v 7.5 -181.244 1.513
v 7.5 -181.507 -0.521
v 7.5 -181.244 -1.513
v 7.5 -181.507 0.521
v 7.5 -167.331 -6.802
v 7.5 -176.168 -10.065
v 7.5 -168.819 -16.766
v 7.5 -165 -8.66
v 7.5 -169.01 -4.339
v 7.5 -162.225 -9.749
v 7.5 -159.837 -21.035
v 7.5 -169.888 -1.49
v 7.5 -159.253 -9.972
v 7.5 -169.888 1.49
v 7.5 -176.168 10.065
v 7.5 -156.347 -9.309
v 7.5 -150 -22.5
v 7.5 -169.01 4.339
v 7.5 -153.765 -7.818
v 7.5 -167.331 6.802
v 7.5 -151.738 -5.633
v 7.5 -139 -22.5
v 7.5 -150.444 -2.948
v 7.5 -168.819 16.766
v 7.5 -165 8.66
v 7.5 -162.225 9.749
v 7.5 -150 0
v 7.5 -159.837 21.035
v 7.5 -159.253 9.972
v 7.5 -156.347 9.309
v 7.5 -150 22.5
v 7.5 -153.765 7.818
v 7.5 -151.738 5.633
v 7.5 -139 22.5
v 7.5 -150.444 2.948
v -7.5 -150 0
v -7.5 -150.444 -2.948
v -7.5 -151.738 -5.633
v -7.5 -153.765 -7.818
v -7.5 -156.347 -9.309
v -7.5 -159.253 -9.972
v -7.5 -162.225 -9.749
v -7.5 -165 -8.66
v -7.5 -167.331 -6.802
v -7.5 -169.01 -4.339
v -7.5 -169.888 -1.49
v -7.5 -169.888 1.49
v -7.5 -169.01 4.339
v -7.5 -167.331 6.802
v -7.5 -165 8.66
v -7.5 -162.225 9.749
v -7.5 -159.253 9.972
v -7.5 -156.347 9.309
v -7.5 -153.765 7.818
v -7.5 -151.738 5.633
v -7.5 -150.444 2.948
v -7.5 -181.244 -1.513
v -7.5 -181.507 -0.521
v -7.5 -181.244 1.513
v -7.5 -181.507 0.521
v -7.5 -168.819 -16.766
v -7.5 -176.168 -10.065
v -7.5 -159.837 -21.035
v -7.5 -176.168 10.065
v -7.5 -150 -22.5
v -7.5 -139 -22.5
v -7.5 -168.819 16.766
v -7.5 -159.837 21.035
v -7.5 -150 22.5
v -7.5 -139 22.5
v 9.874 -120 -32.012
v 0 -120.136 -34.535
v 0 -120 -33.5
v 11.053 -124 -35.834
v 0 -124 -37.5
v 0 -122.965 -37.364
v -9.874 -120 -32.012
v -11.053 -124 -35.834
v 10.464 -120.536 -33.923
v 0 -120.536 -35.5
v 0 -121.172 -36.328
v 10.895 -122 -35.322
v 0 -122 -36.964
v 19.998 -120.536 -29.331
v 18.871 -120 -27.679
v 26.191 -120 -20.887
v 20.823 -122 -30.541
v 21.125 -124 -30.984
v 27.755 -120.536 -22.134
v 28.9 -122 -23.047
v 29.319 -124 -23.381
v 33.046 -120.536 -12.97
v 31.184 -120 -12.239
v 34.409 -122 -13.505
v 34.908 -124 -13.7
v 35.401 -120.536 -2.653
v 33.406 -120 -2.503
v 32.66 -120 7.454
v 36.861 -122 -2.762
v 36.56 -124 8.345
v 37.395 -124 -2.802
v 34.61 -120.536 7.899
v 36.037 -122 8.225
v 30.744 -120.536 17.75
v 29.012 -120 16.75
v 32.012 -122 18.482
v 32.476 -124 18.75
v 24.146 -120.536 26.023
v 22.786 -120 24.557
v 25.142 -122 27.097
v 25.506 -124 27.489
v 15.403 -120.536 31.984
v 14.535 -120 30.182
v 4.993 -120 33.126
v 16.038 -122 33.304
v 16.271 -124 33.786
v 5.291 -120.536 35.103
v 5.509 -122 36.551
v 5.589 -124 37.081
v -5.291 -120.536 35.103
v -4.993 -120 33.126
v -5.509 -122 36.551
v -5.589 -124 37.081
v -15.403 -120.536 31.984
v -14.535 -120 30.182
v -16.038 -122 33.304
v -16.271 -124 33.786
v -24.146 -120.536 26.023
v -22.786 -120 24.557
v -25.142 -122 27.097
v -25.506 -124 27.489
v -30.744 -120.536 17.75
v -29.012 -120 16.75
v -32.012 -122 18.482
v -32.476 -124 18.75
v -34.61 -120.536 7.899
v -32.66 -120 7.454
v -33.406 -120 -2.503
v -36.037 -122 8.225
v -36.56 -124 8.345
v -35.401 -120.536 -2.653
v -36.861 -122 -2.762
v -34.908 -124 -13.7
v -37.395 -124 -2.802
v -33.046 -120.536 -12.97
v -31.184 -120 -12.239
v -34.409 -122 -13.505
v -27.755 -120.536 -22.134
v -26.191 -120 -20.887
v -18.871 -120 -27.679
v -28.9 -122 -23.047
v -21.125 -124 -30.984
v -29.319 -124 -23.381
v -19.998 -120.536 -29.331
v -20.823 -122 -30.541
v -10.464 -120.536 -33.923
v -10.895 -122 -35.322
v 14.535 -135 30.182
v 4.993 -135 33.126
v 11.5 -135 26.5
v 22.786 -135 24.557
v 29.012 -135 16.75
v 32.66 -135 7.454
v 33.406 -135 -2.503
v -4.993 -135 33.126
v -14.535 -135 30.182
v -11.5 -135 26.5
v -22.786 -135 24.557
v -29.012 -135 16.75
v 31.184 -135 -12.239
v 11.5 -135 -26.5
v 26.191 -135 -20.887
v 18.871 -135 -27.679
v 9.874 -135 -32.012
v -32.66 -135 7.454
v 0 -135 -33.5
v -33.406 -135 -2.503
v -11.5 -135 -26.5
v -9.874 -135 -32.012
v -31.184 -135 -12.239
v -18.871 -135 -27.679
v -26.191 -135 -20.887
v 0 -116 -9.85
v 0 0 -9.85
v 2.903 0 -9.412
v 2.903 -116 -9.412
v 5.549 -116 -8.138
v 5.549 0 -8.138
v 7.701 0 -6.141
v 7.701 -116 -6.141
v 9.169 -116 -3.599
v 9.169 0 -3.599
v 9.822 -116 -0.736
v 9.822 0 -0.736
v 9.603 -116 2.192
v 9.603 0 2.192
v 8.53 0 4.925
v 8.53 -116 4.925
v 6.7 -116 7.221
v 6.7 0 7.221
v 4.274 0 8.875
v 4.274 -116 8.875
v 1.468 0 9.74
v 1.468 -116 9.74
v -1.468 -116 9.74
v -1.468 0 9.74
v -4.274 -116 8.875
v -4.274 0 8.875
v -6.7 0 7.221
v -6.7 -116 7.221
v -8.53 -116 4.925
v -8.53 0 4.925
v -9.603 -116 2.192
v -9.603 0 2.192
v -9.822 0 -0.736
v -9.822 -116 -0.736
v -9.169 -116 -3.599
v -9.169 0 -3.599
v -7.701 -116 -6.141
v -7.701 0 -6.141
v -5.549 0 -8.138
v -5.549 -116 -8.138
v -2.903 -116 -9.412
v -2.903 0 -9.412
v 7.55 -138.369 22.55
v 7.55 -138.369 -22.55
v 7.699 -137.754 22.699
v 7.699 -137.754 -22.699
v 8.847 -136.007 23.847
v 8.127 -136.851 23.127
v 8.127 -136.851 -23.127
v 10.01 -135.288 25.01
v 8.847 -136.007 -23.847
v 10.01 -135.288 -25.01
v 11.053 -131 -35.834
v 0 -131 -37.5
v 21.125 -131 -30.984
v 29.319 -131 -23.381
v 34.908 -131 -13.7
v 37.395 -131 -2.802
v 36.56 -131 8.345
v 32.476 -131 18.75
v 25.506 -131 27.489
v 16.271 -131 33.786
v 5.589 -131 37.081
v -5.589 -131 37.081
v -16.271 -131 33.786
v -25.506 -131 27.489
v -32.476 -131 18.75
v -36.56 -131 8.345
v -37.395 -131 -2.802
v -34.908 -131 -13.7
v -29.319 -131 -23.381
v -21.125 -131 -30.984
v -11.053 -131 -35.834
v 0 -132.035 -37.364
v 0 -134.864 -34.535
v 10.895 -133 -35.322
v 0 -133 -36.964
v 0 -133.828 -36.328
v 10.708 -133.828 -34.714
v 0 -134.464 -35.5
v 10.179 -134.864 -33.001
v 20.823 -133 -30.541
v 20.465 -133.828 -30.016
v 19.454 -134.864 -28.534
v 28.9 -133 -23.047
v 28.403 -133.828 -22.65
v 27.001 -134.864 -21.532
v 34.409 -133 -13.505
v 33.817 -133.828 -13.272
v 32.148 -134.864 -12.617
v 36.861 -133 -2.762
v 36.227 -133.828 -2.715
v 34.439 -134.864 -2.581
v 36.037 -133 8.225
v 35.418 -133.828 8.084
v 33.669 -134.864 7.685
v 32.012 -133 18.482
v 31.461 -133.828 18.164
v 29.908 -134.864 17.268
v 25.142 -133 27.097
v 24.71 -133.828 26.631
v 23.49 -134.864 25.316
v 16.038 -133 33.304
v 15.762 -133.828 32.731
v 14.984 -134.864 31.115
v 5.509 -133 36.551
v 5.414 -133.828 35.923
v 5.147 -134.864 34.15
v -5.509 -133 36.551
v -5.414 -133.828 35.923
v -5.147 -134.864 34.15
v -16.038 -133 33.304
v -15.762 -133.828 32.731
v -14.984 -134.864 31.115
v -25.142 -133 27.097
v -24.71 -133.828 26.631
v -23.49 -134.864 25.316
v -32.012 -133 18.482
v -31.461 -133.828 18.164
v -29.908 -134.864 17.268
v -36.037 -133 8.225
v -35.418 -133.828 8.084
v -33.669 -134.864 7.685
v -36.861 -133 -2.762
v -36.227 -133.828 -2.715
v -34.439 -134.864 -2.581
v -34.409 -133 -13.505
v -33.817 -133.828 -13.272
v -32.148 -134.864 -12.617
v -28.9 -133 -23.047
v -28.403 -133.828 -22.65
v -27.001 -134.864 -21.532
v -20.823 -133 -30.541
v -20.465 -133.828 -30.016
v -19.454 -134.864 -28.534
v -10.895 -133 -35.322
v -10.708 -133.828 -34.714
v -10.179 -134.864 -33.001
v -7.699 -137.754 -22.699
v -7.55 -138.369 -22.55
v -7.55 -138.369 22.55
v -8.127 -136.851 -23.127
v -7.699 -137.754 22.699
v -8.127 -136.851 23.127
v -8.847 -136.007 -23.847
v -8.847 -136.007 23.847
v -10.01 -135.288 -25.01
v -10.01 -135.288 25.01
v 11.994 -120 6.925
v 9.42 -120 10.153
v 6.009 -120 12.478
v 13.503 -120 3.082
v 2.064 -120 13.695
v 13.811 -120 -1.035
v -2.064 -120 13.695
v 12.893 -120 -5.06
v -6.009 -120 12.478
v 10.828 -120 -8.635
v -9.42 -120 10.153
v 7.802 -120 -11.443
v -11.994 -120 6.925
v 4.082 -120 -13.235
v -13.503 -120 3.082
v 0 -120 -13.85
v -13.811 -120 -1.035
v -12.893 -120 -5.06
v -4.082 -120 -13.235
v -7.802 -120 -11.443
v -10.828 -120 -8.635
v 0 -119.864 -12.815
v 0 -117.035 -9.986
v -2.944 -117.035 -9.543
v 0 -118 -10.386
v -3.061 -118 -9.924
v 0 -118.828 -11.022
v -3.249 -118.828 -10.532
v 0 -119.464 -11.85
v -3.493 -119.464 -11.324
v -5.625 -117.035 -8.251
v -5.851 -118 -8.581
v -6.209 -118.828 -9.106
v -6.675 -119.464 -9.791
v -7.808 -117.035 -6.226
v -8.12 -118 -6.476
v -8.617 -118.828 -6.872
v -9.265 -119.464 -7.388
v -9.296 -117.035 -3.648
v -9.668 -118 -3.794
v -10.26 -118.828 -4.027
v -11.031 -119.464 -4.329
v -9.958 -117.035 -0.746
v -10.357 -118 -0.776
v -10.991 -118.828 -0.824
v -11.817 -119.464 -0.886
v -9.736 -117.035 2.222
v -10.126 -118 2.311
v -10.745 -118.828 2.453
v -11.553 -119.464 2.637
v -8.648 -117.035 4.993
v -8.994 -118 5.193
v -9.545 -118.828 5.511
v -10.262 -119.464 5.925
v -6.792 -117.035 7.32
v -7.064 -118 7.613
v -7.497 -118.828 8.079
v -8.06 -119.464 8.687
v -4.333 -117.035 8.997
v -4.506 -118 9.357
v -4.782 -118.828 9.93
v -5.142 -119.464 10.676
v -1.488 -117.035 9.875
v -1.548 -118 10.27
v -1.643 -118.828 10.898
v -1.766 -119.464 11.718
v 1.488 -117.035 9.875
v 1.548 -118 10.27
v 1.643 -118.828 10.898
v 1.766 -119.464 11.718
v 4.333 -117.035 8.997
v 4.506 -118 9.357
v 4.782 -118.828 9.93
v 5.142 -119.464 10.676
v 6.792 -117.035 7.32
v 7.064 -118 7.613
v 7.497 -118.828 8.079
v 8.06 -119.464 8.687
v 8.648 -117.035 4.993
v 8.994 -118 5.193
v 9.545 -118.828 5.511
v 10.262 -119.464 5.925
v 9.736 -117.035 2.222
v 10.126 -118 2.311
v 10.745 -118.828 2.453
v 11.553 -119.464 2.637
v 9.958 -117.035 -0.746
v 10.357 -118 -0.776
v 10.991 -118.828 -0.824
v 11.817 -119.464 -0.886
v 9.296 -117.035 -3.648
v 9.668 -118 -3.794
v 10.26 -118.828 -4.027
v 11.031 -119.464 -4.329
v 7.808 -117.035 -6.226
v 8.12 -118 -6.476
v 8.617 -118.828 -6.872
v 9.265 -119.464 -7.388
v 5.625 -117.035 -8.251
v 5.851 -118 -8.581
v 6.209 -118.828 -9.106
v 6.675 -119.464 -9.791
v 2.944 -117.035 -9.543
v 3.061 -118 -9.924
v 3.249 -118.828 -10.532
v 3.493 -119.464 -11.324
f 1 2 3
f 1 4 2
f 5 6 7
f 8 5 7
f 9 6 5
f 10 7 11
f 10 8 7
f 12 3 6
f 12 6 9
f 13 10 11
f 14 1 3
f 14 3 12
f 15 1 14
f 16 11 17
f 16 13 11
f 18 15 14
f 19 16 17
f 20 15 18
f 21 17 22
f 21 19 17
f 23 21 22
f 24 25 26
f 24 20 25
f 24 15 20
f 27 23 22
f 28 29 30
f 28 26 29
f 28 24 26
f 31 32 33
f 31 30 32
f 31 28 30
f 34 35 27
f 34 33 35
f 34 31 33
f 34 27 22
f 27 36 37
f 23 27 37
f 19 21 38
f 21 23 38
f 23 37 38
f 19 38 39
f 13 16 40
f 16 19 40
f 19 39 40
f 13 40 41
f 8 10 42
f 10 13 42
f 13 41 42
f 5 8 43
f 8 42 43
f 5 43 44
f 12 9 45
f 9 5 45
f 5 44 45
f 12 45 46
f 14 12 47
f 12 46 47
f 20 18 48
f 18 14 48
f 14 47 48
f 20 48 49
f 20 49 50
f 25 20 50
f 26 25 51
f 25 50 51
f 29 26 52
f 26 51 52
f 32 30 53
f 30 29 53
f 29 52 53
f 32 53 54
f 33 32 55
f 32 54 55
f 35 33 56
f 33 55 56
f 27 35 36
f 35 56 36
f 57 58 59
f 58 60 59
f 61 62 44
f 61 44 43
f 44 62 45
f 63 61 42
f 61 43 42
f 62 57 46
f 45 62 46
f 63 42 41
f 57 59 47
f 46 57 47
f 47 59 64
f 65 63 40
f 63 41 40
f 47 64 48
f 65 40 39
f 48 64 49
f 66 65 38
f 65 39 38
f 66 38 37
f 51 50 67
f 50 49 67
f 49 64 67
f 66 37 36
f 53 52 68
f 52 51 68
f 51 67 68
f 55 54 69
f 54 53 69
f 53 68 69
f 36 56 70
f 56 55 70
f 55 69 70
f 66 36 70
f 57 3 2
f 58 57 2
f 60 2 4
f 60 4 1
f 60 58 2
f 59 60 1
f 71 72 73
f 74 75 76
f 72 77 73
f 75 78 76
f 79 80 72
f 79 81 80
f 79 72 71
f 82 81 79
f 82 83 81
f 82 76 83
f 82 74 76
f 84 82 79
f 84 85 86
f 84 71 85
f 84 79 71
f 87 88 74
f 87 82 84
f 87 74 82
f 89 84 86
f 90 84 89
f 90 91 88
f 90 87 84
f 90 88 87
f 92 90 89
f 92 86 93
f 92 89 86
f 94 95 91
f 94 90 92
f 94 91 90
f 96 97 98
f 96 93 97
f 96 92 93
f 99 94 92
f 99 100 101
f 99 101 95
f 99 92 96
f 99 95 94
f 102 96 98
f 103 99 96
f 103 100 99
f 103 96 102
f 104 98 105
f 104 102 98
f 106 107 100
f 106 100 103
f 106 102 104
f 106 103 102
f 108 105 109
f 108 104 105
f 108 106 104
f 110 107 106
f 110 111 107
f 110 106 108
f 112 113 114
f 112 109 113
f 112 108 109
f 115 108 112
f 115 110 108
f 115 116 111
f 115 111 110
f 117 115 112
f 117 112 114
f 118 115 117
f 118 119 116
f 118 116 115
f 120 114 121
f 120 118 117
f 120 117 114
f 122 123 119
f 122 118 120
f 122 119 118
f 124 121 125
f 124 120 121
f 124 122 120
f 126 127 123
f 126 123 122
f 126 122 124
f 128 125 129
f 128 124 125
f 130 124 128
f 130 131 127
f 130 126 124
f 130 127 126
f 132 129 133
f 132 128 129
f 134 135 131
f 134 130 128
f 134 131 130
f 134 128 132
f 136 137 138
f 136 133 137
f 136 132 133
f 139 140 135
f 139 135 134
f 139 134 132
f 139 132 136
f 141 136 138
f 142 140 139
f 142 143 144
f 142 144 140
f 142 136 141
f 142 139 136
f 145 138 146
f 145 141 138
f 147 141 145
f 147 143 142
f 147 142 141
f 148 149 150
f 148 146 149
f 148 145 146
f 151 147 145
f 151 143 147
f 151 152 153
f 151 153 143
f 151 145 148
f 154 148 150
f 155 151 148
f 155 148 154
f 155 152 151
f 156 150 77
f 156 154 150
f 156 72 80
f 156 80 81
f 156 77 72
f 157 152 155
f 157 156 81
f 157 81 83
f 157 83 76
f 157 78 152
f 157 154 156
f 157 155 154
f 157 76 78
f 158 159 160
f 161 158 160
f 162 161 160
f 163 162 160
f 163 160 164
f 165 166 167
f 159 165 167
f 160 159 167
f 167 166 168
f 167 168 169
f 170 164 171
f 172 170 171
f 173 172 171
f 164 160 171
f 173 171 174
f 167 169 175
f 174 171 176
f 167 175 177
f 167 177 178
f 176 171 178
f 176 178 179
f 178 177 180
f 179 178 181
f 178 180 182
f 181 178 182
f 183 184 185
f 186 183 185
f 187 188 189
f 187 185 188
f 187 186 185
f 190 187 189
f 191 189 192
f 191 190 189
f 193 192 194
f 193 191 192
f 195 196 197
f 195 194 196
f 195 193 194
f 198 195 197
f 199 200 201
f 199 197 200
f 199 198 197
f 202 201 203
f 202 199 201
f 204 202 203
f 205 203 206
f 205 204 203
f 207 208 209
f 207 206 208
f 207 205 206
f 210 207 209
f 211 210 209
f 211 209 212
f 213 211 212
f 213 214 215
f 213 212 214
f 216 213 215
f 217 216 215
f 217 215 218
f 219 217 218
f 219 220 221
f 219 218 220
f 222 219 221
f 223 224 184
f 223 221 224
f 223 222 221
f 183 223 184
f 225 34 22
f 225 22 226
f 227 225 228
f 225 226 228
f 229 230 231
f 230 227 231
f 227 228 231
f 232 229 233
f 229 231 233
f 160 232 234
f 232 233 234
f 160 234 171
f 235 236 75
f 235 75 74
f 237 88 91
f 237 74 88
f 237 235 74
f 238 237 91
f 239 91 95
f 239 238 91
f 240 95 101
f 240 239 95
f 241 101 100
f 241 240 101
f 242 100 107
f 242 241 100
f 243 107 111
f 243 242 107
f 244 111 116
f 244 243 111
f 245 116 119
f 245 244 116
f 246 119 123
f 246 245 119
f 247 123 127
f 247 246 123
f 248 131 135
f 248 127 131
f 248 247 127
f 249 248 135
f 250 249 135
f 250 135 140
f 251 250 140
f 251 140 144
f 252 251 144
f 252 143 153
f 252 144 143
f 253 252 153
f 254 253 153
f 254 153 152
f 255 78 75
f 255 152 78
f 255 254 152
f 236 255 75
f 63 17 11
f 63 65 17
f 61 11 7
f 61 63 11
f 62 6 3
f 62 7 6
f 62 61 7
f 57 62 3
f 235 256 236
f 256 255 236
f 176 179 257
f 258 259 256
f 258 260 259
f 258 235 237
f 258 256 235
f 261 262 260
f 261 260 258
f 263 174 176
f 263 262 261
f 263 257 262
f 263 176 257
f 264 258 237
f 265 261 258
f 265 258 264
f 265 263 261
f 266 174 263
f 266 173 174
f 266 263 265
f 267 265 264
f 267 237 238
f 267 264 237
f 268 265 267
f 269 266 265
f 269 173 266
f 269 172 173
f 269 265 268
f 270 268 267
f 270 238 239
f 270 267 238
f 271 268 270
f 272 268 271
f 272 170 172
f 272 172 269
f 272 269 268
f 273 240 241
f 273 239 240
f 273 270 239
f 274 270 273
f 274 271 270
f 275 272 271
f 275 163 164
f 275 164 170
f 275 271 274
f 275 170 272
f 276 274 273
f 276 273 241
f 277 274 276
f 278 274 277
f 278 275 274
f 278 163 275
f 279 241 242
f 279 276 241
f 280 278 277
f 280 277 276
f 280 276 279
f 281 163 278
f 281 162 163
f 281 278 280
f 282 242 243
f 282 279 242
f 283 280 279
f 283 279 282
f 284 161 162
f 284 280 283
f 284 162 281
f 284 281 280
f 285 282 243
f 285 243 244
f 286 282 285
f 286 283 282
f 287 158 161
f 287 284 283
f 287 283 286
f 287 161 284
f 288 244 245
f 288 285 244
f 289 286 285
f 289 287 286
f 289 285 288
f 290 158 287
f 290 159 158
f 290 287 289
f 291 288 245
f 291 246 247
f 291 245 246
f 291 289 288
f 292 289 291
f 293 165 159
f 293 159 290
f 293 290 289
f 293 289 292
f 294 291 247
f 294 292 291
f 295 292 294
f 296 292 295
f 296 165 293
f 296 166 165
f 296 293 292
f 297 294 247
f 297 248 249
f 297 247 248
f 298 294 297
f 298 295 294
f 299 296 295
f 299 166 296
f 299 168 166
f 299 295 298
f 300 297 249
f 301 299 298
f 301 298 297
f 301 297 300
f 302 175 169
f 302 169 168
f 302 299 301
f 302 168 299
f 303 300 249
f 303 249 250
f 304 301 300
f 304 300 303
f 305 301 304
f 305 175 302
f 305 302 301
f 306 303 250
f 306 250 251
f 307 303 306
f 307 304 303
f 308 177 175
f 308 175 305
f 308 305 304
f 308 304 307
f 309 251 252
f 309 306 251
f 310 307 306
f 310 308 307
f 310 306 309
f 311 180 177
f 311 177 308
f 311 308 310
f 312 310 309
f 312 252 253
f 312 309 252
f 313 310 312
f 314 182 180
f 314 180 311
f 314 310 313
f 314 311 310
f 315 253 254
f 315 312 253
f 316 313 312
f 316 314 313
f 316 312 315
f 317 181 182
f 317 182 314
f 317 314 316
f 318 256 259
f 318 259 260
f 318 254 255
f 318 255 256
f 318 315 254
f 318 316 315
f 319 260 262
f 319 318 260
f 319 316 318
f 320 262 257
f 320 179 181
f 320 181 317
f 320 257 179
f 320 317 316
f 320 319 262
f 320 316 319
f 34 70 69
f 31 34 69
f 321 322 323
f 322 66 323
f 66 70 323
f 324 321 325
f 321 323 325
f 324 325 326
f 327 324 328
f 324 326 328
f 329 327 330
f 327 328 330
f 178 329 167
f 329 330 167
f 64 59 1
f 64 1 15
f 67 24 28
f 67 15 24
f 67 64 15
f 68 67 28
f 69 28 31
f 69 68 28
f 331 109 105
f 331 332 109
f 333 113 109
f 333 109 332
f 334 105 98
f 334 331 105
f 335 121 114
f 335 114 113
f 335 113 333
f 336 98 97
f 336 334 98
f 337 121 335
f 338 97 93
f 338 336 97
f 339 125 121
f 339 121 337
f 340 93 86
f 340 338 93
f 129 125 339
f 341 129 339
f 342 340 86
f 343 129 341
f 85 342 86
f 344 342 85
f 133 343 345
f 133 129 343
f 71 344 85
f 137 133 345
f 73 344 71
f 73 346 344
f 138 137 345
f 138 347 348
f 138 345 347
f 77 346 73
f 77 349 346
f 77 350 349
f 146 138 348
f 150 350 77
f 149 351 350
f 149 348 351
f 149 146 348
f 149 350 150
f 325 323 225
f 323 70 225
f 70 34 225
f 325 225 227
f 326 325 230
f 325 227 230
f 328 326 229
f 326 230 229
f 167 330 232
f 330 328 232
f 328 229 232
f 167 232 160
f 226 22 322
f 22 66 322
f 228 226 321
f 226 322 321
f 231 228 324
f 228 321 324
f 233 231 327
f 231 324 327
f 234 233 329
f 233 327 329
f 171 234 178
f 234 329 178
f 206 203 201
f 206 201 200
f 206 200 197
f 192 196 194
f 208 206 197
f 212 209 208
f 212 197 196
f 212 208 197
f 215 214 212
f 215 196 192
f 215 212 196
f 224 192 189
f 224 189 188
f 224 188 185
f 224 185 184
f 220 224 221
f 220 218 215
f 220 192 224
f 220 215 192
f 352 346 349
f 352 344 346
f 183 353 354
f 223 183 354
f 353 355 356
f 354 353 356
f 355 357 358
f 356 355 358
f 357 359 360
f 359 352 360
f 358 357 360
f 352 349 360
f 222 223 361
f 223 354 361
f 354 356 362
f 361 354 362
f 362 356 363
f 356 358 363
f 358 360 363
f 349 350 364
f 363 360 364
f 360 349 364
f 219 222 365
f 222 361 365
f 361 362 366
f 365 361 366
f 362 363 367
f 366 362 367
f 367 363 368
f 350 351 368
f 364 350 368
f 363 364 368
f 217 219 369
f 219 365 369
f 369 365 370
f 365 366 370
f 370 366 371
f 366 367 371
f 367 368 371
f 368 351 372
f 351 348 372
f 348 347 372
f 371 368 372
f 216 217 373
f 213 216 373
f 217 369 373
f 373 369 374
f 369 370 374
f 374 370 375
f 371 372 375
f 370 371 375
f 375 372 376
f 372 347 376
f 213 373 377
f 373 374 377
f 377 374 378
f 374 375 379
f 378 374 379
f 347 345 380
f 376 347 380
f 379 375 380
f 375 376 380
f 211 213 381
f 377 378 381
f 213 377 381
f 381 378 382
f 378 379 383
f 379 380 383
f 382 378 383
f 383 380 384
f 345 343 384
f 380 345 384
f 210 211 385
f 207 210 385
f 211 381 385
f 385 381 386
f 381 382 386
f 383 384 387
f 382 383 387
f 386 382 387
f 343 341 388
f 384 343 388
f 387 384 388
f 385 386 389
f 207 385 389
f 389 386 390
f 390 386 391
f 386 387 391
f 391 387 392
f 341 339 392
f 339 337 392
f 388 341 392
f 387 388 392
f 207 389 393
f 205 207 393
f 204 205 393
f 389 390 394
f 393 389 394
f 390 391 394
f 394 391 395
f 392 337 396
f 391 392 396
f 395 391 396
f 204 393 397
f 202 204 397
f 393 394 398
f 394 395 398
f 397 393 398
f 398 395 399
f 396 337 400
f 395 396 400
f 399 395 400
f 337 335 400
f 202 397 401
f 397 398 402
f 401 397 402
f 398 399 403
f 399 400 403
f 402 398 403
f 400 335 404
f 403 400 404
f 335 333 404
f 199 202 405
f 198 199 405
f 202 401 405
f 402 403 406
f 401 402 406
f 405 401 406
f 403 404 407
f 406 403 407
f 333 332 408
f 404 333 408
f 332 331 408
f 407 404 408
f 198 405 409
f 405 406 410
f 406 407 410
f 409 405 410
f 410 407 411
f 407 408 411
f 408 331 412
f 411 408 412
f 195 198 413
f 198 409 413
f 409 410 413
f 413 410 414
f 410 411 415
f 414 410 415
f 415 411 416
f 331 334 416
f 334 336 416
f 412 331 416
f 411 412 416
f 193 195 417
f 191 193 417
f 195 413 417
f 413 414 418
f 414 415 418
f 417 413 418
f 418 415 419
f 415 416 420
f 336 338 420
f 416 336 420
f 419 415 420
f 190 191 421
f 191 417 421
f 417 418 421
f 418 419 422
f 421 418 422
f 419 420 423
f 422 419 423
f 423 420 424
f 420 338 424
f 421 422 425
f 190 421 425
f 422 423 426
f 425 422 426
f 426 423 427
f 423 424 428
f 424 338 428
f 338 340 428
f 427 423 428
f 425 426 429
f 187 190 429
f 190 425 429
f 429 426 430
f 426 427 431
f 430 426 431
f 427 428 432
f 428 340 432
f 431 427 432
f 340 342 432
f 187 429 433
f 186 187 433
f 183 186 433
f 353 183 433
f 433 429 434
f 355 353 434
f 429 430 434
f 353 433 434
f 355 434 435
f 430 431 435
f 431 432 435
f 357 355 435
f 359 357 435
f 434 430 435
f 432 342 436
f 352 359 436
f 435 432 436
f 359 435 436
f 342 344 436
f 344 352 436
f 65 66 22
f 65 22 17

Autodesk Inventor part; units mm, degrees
ref_plane "YZ Plane" through (0, 0, 0) normal (1, 0, 0) x (0, 1, 0)
ref_plane "XZ Plane" through (0, 0, 0) normal (0, 1, 0) x (-1, 0, 0)
ref_plane "XY Plane" through (0, 0, 0) normal (0, 0, 1) x (1, 0, 0)
sketch "Sketch1" plane through (0, 0, 0) normal (1, 0, 0) x (0, 1, 0)
  line L0 (0, 0) -> (0, -9.85)
  line L1 (0, -9.85) -> (-120, -9.85)
  line L2 (-120, -9.85) -> (-120, -37.5)
  line L3 (-120, -37.5) -> (-135, -37.5)
  line L4 (-135, -37.5) -> (-135, 0)
  line L5 (-135, 0) -> (0, 0)
  line L6 (-135, 0) -> (-135, 22.5)
  line L7 (-135, 22.5) -> (-150, 22.5)
  line L8 (-135, 0) -> (-135, -22.5)
  line L9 (-135, -22.5) -> (-150, -22.5)
  arc A0 (-150, 22.5) -> (-181.8198, 0) centre (-150, -11.25) ccw
  arc A1 (-181.8198, 0) -> (-150, -22.5) centre (-150, 11.25) ccw
  arc A2 (-120, -10.1) -> (-119.8236, -9.85) centre (-150, 11.25) ccw
  circle A3 centre (-160, 0) radius 10
  dimension "d0" = 9.85
  dimension "d1" = 120
  dimension "d2" = 27.65
  dimension "d3" = 15
  dimension "d4" = 22.5
  dimension "d5" = 15
  dimension "d6" = 22.5
  dimension "d14" = 33.75
  dimension "d15" = 33.75
  dimension "d16" = 20
  dimension "d17" = 25
revolve "Revolution1" add sketch "Sketch1" angle 360 about axis through (0, -135, 0) along (0, 1, 0) contours L0 L1 L2 L3 L4 L5
extrude "Extrusion1" add sketch "Sketch1" along normal mid plane 15 contours L4 L9 A1 A0 L7 L6
fillet "Fillet1" radius 4 7 edges at (0, -120, 37.5) (0, -135, 37.5) (0, -120, 9.85) (7.5, -135, 0) (0, -135, 22.5) (0, -135, -22.5) (-7.5, -135, 0)
fillet "Fillet2" radius 4 1 edges at (0, -181.8198, 0)
properties material "Aluminum 6061"
